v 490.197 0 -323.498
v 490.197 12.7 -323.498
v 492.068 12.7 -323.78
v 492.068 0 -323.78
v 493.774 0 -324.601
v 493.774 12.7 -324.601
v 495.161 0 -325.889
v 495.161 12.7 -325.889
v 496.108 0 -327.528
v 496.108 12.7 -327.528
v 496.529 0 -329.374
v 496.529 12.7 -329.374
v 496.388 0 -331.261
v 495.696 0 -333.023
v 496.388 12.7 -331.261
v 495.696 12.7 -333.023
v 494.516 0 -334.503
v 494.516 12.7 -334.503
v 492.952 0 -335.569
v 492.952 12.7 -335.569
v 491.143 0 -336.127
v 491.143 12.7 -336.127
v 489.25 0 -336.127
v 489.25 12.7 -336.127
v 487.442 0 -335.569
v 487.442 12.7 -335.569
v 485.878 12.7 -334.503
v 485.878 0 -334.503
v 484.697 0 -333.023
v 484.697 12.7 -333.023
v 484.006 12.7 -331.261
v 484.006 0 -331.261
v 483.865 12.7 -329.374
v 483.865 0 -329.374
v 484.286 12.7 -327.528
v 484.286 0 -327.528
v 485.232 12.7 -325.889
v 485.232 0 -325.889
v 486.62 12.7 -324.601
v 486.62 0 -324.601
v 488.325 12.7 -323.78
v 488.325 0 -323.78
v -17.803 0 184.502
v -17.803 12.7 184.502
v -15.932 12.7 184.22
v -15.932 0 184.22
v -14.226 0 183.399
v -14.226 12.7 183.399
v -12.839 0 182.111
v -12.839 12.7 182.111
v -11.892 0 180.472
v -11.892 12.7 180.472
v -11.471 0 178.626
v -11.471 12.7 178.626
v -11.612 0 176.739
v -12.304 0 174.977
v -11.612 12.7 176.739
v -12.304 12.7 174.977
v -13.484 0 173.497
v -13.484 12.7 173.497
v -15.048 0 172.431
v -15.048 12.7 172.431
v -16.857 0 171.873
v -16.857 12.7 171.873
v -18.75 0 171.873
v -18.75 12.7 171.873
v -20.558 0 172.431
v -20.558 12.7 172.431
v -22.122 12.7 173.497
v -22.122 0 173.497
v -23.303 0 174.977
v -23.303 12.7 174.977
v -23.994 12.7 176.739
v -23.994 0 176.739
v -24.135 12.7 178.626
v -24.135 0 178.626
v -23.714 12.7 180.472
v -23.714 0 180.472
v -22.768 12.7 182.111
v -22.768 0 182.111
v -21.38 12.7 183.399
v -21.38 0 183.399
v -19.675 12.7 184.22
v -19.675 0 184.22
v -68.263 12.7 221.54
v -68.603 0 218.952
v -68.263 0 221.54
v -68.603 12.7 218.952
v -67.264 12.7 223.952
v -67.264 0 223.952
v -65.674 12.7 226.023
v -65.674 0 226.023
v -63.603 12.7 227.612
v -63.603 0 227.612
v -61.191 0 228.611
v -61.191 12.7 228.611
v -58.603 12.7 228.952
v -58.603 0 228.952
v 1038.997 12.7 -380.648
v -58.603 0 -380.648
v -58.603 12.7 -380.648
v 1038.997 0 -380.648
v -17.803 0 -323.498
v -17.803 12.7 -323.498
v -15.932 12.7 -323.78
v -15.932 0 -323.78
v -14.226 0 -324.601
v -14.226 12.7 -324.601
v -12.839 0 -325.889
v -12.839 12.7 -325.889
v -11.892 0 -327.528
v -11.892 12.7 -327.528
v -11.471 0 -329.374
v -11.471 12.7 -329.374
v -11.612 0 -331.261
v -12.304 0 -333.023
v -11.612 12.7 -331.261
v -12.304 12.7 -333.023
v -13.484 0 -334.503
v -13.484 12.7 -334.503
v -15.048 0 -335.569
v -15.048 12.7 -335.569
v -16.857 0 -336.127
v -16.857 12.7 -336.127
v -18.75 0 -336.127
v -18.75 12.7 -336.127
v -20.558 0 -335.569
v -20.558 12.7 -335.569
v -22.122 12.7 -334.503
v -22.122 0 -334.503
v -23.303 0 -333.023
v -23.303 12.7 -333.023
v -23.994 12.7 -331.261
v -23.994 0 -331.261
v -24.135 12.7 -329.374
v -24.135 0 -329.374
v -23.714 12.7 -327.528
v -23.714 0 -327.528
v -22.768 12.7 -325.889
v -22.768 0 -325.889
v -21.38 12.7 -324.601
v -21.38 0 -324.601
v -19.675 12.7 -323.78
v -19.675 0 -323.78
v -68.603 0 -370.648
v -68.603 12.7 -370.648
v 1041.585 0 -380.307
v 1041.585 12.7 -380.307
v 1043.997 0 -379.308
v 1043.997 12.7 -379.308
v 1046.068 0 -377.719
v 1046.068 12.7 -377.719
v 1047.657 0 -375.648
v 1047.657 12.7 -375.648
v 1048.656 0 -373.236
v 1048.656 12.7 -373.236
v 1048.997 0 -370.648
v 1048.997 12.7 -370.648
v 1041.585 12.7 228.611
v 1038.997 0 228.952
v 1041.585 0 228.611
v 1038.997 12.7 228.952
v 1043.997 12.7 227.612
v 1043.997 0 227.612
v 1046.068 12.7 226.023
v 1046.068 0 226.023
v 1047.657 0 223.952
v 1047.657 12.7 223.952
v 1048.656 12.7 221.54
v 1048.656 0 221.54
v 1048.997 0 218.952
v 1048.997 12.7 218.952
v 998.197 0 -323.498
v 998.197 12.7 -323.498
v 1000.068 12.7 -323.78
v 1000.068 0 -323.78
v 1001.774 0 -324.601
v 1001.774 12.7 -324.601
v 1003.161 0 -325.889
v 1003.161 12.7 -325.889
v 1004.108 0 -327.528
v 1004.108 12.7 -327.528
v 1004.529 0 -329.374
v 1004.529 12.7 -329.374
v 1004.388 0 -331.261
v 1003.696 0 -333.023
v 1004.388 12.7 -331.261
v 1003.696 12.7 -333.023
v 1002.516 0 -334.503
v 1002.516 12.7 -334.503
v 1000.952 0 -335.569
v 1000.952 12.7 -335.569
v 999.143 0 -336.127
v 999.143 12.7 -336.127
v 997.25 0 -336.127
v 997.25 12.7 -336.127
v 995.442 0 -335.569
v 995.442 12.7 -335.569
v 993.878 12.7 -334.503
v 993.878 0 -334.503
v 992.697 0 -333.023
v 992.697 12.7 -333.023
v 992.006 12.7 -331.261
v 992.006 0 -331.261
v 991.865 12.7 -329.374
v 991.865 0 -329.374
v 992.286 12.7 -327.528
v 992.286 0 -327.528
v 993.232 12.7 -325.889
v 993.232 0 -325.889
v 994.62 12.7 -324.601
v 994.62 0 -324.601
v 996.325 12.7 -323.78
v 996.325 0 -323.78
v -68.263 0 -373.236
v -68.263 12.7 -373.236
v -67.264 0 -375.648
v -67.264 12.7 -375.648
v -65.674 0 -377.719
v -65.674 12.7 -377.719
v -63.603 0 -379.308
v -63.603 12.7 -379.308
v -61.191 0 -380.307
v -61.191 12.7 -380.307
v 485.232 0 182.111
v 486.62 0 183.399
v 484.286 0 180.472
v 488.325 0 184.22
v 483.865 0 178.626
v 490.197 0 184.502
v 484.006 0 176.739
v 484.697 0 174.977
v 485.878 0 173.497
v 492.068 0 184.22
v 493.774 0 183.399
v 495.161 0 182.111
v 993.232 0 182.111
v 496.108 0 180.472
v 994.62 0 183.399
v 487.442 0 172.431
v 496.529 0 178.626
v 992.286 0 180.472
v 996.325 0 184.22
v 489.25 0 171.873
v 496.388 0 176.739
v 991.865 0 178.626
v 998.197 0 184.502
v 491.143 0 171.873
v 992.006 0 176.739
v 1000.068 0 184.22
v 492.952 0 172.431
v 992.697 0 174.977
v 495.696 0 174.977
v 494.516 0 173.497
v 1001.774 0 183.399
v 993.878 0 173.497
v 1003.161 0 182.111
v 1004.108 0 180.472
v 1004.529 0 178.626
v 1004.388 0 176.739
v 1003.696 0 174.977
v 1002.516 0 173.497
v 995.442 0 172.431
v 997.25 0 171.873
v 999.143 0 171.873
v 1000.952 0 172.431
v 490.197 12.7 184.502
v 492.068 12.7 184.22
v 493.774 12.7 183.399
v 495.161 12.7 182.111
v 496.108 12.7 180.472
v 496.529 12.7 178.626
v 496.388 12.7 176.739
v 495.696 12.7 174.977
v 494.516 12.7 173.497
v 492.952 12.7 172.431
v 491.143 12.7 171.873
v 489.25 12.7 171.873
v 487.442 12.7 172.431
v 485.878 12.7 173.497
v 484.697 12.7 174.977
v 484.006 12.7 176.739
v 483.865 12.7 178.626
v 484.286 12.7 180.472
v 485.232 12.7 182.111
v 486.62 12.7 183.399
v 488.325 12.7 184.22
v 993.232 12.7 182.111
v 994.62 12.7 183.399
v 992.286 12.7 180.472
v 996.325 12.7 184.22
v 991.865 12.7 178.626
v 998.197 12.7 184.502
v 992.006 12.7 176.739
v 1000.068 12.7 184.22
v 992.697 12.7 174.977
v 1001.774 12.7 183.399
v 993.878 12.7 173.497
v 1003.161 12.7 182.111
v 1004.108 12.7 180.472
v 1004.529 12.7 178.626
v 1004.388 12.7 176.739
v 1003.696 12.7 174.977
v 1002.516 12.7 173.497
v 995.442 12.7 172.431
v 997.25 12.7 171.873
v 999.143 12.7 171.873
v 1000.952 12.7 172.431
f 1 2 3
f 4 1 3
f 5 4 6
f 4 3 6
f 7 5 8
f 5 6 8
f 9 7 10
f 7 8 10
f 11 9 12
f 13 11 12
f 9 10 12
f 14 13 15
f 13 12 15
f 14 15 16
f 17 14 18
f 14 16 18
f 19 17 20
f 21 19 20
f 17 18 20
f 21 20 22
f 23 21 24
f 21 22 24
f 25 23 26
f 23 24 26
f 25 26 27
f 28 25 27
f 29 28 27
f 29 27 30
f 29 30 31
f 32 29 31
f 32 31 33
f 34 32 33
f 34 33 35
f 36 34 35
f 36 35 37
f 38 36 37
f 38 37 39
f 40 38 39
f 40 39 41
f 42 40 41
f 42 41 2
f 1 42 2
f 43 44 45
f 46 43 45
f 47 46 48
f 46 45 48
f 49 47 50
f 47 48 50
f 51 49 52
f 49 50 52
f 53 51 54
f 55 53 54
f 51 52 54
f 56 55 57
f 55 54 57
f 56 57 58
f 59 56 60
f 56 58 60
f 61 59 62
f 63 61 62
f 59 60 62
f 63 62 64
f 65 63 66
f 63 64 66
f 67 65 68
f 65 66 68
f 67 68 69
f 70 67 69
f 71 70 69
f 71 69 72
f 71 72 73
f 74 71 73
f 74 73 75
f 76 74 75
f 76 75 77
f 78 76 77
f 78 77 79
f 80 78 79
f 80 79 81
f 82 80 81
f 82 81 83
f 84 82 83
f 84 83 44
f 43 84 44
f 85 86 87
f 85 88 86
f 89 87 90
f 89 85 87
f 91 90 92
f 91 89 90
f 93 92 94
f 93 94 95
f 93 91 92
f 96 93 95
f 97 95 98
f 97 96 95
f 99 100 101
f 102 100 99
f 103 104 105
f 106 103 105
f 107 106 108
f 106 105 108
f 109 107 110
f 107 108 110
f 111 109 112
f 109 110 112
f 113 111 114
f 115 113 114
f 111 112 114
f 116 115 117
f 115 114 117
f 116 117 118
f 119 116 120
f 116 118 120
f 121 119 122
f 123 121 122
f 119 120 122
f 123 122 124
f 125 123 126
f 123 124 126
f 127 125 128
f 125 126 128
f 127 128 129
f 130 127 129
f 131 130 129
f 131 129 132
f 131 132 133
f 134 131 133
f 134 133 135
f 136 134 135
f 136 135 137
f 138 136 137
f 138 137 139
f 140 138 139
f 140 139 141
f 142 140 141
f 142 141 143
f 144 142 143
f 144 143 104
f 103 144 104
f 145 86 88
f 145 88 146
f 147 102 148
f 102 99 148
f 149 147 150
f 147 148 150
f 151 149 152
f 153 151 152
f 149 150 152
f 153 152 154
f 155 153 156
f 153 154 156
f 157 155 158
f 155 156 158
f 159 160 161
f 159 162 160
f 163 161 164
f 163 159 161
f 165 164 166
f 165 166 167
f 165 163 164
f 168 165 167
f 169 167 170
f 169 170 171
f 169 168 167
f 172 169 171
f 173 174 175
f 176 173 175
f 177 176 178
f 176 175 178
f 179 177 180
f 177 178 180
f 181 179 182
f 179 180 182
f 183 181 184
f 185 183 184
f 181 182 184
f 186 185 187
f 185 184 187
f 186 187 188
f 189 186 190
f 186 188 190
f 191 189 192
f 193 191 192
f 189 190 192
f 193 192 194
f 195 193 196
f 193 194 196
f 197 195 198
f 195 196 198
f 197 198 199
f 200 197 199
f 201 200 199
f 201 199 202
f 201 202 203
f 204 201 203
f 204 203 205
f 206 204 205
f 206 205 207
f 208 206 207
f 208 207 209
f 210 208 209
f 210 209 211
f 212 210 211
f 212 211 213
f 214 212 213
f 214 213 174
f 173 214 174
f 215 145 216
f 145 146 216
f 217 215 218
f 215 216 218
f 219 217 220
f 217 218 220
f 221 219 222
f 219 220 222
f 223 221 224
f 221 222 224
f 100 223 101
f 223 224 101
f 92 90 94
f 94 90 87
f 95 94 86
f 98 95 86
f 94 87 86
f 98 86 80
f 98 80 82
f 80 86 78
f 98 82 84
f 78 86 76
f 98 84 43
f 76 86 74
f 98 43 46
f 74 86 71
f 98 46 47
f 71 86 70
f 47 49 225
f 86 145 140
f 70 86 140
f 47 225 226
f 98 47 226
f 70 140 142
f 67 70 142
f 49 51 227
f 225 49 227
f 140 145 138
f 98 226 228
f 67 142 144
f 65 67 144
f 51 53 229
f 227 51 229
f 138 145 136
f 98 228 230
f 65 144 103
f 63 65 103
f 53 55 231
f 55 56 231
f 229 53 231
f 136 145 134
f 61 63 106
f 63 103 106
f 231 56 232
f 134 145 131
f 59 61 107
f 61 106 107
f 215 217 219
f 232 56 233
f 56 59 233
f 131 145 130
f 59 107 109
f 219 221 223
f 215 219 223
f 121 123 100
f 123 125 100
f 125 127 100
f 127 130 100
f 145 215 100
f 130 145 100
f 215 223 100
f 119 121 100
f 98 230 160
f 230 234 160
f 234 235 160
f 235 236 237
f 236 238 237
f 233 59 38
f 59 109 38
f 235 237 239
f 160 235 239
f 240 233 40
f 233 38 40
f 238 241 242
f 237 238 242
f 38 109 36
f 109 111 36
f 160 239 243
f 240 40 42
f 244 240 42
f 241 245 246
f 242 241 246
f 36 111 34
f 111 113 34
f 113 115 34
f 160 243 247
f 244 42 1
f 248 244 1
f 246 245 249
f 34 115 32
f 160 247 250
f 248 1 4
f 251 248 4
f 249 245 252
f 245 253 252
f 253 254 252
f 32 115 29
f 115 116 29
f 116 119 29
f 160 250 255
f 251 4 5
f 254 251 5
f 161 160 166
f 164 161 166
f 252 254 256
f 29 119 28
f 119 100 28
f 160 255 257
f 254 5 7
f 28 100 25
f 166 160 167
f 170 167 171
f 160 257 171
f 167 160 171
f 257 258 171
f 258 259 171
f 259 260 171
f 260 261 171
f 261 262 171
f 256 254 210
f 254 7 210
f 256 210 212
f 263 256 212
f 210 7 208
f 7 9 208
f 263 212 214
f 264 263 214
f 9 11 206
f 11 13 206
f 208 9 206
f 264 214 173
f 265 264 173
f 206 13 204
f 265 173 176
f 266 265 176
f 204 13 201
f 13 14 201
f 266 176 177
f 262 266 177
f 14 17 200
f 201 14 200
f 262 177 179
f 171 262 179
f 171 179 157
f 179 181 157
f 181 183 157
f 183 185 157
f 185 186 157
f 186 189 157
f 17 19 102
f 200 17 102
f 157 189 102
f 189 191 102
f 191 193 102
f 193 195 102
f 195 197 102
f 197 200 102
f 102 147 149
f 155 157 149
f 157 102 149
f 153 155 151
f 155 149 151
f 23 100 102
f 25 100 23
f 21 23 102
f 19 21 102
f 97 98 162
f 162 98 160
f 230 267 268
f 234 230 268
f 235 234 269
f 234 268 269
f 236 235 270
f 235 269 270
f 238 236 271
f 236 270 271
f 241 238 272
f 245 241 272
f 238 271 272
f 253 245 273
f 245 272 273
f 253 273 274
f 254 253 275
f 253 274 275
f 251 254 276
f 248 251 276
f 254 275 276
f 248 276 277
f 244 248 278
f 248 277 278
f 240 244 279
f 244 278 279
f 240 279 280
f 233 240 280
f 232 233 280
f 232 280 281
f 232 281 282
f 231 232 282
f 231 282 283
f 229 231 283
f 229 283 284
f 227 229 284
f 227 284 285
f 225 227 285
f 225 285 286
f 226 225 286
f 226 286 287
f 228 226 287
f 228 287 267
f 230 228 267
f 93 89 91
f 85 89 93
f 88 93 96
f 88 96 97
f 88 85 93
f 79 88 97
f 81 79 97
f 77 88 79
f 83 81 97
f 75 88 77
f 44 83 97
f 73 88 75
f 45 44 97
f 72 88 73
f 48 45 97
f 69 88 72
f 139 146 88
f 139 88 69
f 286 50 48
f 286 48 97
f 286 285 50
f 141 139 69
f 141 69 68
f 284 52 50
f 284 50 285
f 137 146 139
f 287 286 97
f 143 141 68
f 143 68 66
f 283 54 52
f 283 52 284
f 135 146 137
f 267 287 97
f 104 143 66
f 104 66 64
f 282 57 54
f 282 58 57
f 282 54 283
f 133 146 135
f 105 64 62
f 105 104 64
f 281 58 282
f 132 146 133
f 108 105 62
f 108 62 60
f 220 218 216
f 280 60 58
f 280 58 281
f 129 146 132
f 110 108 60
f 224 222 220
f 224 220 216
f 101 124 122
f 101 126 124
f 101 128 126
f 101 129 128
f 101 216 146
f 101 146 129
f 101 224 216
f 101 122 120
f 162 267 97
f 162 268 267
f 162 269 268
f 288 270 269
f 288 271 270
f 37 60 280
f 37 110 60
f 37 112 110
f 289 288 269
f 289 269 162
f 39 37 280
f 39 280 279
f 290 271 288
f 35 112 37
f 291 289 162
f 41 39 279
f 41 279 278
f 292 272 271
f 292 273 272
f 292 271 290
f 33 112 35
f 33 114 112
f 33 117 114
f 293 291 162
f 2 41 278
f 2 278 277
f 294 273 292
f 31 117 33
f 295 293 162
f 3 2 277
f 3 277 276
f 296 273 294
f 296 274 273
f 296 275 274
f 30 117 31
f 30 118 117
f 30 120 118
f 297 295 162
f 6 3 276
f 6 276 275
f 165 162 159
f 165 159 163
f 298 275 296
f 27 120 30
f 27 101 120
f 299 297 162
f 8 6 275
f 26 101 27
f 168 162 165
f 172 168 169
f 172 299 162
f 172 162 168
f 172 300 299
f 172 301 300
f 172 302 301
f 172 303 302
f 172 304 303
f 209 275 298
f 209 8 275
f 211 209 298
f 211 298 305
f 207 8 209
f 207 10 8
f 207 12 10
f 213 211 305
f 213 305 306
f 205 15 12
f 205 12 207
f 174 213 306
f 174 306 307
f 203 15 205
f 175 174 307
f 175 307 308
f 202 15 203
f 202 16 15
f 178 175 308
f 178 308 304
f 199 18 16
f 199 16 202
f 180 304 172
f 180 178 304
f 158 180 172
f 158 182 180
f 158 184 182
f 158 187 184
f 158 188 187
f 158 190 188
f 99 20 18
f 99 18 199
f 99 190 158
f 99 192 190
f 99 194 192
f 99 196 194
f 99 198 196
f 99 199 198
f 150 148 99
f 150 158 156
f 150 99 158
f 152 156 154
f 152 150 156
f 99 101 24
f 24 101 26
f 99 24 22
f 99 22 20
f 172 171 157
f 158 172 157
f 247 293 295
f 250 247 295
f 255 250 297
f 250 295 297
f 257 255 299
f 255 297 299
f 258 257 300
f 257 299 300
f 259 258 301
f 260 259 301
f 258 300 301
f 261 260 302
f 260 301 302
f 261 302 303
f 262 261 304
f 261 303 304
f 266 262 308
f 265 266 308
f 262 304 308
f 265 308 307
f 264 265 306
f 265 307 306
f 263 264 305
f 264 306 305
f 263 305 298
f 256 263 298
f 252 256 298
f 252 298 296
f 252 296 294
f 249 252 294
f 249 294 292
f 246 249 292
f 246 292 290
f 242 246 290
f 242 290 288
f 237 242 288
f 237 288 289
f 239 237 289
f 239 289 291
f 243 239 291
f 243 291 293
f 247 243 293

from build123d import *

# Parameters (mm, degrees)
SKETCH1_W           = 1117.6
SKETCH1_H           = 609.6
BOSS_EXTRUDE1_DEPTH = 12.7
SKETCH2_R           = 6.35
CUT_EXTRUDE1_DEPTH  = 1116.996604756
SKETCH3_R           = 6.35
CUT_EXTRUDE2_DEPTH  = 1116.996604756
FILLET1_R           = 10


with BuildPart() as part:
    # Sketch1 → Boss-Extrude1 (new body)
    with BuildSketch(Plane(origin=(0, 0, 0), x_dir=(1, 0, 0), z_dir=(0, 1, 0))):
        with Locations((490.196746459, 75.848075978)):
            Rectangle(SKETCH1_W, SKETCH1_H)
    extrude(amount=BOSS_EXTRUDE1_DEPTH)

    # Sketch2 → Cut-Extrude1 (cut, through all)
    with BuildSketch(Plane(origin=(0, 12.7, 0), x_dir=(1, 0, 0), z_dir=(0, 1, 0))):
        with Locations(Location((998.196746459, -178.151924022, 0), (0, 0, 270))):
            Circle(SKETCH2_R)
        with Locations(Location((-17.803253541, -178.151924022, 0), (0, 0, 270))):
            Circle(SKETCH2_R)
        with Locations(Location((-17.803253541, 329.848075978, 0), (0, 0, 270))):
            Circle(SKETCH2_R)
        with Locations(Location((998.196746459, 329.848075978, 0), (0, 0, 270))):
            Circle(SKETCH2_R)
    extrude(amount=-CUT_EXTRUDE1_DEPTH, mode=Mode.SUBTRACT)

    # Sketch3 → Cut-Extrude2 (cut, through all)
    with BuildSketch(Plane(origin=(0, 12.7, 0), x_dir=(1, 0, 0), z_dir=(0, 1, 0))):
        with Locations(Location((490.196746459, -178.151924022, 0), (0, 0, 270))):
            Circle(SKETCH3_R)
        with Locations(Location((490.196746459, 329.848075978, 0), (0, 0, 270))):
            Circle(SKETCH3_R)
    extrude(amount=-CUT_EXTRUDE2_DEPTH, mode=Mode.SUBTRACT)

    # Fillet1
    fillet1_edges = [part.edges().sort_by_distance(p)[0] for p in [
        (1048.996746459, 6.35, 228.951924022),
        (-68.603253541, 6.35, 228.951924022),
        (-68.603253541, 6.35, -380.648075978),
        (1048.996746459, 6.35, -380.648075978),
    ]]
    fillet(fillet1_edges, radius=FILLET1_R)


solid = part.part
